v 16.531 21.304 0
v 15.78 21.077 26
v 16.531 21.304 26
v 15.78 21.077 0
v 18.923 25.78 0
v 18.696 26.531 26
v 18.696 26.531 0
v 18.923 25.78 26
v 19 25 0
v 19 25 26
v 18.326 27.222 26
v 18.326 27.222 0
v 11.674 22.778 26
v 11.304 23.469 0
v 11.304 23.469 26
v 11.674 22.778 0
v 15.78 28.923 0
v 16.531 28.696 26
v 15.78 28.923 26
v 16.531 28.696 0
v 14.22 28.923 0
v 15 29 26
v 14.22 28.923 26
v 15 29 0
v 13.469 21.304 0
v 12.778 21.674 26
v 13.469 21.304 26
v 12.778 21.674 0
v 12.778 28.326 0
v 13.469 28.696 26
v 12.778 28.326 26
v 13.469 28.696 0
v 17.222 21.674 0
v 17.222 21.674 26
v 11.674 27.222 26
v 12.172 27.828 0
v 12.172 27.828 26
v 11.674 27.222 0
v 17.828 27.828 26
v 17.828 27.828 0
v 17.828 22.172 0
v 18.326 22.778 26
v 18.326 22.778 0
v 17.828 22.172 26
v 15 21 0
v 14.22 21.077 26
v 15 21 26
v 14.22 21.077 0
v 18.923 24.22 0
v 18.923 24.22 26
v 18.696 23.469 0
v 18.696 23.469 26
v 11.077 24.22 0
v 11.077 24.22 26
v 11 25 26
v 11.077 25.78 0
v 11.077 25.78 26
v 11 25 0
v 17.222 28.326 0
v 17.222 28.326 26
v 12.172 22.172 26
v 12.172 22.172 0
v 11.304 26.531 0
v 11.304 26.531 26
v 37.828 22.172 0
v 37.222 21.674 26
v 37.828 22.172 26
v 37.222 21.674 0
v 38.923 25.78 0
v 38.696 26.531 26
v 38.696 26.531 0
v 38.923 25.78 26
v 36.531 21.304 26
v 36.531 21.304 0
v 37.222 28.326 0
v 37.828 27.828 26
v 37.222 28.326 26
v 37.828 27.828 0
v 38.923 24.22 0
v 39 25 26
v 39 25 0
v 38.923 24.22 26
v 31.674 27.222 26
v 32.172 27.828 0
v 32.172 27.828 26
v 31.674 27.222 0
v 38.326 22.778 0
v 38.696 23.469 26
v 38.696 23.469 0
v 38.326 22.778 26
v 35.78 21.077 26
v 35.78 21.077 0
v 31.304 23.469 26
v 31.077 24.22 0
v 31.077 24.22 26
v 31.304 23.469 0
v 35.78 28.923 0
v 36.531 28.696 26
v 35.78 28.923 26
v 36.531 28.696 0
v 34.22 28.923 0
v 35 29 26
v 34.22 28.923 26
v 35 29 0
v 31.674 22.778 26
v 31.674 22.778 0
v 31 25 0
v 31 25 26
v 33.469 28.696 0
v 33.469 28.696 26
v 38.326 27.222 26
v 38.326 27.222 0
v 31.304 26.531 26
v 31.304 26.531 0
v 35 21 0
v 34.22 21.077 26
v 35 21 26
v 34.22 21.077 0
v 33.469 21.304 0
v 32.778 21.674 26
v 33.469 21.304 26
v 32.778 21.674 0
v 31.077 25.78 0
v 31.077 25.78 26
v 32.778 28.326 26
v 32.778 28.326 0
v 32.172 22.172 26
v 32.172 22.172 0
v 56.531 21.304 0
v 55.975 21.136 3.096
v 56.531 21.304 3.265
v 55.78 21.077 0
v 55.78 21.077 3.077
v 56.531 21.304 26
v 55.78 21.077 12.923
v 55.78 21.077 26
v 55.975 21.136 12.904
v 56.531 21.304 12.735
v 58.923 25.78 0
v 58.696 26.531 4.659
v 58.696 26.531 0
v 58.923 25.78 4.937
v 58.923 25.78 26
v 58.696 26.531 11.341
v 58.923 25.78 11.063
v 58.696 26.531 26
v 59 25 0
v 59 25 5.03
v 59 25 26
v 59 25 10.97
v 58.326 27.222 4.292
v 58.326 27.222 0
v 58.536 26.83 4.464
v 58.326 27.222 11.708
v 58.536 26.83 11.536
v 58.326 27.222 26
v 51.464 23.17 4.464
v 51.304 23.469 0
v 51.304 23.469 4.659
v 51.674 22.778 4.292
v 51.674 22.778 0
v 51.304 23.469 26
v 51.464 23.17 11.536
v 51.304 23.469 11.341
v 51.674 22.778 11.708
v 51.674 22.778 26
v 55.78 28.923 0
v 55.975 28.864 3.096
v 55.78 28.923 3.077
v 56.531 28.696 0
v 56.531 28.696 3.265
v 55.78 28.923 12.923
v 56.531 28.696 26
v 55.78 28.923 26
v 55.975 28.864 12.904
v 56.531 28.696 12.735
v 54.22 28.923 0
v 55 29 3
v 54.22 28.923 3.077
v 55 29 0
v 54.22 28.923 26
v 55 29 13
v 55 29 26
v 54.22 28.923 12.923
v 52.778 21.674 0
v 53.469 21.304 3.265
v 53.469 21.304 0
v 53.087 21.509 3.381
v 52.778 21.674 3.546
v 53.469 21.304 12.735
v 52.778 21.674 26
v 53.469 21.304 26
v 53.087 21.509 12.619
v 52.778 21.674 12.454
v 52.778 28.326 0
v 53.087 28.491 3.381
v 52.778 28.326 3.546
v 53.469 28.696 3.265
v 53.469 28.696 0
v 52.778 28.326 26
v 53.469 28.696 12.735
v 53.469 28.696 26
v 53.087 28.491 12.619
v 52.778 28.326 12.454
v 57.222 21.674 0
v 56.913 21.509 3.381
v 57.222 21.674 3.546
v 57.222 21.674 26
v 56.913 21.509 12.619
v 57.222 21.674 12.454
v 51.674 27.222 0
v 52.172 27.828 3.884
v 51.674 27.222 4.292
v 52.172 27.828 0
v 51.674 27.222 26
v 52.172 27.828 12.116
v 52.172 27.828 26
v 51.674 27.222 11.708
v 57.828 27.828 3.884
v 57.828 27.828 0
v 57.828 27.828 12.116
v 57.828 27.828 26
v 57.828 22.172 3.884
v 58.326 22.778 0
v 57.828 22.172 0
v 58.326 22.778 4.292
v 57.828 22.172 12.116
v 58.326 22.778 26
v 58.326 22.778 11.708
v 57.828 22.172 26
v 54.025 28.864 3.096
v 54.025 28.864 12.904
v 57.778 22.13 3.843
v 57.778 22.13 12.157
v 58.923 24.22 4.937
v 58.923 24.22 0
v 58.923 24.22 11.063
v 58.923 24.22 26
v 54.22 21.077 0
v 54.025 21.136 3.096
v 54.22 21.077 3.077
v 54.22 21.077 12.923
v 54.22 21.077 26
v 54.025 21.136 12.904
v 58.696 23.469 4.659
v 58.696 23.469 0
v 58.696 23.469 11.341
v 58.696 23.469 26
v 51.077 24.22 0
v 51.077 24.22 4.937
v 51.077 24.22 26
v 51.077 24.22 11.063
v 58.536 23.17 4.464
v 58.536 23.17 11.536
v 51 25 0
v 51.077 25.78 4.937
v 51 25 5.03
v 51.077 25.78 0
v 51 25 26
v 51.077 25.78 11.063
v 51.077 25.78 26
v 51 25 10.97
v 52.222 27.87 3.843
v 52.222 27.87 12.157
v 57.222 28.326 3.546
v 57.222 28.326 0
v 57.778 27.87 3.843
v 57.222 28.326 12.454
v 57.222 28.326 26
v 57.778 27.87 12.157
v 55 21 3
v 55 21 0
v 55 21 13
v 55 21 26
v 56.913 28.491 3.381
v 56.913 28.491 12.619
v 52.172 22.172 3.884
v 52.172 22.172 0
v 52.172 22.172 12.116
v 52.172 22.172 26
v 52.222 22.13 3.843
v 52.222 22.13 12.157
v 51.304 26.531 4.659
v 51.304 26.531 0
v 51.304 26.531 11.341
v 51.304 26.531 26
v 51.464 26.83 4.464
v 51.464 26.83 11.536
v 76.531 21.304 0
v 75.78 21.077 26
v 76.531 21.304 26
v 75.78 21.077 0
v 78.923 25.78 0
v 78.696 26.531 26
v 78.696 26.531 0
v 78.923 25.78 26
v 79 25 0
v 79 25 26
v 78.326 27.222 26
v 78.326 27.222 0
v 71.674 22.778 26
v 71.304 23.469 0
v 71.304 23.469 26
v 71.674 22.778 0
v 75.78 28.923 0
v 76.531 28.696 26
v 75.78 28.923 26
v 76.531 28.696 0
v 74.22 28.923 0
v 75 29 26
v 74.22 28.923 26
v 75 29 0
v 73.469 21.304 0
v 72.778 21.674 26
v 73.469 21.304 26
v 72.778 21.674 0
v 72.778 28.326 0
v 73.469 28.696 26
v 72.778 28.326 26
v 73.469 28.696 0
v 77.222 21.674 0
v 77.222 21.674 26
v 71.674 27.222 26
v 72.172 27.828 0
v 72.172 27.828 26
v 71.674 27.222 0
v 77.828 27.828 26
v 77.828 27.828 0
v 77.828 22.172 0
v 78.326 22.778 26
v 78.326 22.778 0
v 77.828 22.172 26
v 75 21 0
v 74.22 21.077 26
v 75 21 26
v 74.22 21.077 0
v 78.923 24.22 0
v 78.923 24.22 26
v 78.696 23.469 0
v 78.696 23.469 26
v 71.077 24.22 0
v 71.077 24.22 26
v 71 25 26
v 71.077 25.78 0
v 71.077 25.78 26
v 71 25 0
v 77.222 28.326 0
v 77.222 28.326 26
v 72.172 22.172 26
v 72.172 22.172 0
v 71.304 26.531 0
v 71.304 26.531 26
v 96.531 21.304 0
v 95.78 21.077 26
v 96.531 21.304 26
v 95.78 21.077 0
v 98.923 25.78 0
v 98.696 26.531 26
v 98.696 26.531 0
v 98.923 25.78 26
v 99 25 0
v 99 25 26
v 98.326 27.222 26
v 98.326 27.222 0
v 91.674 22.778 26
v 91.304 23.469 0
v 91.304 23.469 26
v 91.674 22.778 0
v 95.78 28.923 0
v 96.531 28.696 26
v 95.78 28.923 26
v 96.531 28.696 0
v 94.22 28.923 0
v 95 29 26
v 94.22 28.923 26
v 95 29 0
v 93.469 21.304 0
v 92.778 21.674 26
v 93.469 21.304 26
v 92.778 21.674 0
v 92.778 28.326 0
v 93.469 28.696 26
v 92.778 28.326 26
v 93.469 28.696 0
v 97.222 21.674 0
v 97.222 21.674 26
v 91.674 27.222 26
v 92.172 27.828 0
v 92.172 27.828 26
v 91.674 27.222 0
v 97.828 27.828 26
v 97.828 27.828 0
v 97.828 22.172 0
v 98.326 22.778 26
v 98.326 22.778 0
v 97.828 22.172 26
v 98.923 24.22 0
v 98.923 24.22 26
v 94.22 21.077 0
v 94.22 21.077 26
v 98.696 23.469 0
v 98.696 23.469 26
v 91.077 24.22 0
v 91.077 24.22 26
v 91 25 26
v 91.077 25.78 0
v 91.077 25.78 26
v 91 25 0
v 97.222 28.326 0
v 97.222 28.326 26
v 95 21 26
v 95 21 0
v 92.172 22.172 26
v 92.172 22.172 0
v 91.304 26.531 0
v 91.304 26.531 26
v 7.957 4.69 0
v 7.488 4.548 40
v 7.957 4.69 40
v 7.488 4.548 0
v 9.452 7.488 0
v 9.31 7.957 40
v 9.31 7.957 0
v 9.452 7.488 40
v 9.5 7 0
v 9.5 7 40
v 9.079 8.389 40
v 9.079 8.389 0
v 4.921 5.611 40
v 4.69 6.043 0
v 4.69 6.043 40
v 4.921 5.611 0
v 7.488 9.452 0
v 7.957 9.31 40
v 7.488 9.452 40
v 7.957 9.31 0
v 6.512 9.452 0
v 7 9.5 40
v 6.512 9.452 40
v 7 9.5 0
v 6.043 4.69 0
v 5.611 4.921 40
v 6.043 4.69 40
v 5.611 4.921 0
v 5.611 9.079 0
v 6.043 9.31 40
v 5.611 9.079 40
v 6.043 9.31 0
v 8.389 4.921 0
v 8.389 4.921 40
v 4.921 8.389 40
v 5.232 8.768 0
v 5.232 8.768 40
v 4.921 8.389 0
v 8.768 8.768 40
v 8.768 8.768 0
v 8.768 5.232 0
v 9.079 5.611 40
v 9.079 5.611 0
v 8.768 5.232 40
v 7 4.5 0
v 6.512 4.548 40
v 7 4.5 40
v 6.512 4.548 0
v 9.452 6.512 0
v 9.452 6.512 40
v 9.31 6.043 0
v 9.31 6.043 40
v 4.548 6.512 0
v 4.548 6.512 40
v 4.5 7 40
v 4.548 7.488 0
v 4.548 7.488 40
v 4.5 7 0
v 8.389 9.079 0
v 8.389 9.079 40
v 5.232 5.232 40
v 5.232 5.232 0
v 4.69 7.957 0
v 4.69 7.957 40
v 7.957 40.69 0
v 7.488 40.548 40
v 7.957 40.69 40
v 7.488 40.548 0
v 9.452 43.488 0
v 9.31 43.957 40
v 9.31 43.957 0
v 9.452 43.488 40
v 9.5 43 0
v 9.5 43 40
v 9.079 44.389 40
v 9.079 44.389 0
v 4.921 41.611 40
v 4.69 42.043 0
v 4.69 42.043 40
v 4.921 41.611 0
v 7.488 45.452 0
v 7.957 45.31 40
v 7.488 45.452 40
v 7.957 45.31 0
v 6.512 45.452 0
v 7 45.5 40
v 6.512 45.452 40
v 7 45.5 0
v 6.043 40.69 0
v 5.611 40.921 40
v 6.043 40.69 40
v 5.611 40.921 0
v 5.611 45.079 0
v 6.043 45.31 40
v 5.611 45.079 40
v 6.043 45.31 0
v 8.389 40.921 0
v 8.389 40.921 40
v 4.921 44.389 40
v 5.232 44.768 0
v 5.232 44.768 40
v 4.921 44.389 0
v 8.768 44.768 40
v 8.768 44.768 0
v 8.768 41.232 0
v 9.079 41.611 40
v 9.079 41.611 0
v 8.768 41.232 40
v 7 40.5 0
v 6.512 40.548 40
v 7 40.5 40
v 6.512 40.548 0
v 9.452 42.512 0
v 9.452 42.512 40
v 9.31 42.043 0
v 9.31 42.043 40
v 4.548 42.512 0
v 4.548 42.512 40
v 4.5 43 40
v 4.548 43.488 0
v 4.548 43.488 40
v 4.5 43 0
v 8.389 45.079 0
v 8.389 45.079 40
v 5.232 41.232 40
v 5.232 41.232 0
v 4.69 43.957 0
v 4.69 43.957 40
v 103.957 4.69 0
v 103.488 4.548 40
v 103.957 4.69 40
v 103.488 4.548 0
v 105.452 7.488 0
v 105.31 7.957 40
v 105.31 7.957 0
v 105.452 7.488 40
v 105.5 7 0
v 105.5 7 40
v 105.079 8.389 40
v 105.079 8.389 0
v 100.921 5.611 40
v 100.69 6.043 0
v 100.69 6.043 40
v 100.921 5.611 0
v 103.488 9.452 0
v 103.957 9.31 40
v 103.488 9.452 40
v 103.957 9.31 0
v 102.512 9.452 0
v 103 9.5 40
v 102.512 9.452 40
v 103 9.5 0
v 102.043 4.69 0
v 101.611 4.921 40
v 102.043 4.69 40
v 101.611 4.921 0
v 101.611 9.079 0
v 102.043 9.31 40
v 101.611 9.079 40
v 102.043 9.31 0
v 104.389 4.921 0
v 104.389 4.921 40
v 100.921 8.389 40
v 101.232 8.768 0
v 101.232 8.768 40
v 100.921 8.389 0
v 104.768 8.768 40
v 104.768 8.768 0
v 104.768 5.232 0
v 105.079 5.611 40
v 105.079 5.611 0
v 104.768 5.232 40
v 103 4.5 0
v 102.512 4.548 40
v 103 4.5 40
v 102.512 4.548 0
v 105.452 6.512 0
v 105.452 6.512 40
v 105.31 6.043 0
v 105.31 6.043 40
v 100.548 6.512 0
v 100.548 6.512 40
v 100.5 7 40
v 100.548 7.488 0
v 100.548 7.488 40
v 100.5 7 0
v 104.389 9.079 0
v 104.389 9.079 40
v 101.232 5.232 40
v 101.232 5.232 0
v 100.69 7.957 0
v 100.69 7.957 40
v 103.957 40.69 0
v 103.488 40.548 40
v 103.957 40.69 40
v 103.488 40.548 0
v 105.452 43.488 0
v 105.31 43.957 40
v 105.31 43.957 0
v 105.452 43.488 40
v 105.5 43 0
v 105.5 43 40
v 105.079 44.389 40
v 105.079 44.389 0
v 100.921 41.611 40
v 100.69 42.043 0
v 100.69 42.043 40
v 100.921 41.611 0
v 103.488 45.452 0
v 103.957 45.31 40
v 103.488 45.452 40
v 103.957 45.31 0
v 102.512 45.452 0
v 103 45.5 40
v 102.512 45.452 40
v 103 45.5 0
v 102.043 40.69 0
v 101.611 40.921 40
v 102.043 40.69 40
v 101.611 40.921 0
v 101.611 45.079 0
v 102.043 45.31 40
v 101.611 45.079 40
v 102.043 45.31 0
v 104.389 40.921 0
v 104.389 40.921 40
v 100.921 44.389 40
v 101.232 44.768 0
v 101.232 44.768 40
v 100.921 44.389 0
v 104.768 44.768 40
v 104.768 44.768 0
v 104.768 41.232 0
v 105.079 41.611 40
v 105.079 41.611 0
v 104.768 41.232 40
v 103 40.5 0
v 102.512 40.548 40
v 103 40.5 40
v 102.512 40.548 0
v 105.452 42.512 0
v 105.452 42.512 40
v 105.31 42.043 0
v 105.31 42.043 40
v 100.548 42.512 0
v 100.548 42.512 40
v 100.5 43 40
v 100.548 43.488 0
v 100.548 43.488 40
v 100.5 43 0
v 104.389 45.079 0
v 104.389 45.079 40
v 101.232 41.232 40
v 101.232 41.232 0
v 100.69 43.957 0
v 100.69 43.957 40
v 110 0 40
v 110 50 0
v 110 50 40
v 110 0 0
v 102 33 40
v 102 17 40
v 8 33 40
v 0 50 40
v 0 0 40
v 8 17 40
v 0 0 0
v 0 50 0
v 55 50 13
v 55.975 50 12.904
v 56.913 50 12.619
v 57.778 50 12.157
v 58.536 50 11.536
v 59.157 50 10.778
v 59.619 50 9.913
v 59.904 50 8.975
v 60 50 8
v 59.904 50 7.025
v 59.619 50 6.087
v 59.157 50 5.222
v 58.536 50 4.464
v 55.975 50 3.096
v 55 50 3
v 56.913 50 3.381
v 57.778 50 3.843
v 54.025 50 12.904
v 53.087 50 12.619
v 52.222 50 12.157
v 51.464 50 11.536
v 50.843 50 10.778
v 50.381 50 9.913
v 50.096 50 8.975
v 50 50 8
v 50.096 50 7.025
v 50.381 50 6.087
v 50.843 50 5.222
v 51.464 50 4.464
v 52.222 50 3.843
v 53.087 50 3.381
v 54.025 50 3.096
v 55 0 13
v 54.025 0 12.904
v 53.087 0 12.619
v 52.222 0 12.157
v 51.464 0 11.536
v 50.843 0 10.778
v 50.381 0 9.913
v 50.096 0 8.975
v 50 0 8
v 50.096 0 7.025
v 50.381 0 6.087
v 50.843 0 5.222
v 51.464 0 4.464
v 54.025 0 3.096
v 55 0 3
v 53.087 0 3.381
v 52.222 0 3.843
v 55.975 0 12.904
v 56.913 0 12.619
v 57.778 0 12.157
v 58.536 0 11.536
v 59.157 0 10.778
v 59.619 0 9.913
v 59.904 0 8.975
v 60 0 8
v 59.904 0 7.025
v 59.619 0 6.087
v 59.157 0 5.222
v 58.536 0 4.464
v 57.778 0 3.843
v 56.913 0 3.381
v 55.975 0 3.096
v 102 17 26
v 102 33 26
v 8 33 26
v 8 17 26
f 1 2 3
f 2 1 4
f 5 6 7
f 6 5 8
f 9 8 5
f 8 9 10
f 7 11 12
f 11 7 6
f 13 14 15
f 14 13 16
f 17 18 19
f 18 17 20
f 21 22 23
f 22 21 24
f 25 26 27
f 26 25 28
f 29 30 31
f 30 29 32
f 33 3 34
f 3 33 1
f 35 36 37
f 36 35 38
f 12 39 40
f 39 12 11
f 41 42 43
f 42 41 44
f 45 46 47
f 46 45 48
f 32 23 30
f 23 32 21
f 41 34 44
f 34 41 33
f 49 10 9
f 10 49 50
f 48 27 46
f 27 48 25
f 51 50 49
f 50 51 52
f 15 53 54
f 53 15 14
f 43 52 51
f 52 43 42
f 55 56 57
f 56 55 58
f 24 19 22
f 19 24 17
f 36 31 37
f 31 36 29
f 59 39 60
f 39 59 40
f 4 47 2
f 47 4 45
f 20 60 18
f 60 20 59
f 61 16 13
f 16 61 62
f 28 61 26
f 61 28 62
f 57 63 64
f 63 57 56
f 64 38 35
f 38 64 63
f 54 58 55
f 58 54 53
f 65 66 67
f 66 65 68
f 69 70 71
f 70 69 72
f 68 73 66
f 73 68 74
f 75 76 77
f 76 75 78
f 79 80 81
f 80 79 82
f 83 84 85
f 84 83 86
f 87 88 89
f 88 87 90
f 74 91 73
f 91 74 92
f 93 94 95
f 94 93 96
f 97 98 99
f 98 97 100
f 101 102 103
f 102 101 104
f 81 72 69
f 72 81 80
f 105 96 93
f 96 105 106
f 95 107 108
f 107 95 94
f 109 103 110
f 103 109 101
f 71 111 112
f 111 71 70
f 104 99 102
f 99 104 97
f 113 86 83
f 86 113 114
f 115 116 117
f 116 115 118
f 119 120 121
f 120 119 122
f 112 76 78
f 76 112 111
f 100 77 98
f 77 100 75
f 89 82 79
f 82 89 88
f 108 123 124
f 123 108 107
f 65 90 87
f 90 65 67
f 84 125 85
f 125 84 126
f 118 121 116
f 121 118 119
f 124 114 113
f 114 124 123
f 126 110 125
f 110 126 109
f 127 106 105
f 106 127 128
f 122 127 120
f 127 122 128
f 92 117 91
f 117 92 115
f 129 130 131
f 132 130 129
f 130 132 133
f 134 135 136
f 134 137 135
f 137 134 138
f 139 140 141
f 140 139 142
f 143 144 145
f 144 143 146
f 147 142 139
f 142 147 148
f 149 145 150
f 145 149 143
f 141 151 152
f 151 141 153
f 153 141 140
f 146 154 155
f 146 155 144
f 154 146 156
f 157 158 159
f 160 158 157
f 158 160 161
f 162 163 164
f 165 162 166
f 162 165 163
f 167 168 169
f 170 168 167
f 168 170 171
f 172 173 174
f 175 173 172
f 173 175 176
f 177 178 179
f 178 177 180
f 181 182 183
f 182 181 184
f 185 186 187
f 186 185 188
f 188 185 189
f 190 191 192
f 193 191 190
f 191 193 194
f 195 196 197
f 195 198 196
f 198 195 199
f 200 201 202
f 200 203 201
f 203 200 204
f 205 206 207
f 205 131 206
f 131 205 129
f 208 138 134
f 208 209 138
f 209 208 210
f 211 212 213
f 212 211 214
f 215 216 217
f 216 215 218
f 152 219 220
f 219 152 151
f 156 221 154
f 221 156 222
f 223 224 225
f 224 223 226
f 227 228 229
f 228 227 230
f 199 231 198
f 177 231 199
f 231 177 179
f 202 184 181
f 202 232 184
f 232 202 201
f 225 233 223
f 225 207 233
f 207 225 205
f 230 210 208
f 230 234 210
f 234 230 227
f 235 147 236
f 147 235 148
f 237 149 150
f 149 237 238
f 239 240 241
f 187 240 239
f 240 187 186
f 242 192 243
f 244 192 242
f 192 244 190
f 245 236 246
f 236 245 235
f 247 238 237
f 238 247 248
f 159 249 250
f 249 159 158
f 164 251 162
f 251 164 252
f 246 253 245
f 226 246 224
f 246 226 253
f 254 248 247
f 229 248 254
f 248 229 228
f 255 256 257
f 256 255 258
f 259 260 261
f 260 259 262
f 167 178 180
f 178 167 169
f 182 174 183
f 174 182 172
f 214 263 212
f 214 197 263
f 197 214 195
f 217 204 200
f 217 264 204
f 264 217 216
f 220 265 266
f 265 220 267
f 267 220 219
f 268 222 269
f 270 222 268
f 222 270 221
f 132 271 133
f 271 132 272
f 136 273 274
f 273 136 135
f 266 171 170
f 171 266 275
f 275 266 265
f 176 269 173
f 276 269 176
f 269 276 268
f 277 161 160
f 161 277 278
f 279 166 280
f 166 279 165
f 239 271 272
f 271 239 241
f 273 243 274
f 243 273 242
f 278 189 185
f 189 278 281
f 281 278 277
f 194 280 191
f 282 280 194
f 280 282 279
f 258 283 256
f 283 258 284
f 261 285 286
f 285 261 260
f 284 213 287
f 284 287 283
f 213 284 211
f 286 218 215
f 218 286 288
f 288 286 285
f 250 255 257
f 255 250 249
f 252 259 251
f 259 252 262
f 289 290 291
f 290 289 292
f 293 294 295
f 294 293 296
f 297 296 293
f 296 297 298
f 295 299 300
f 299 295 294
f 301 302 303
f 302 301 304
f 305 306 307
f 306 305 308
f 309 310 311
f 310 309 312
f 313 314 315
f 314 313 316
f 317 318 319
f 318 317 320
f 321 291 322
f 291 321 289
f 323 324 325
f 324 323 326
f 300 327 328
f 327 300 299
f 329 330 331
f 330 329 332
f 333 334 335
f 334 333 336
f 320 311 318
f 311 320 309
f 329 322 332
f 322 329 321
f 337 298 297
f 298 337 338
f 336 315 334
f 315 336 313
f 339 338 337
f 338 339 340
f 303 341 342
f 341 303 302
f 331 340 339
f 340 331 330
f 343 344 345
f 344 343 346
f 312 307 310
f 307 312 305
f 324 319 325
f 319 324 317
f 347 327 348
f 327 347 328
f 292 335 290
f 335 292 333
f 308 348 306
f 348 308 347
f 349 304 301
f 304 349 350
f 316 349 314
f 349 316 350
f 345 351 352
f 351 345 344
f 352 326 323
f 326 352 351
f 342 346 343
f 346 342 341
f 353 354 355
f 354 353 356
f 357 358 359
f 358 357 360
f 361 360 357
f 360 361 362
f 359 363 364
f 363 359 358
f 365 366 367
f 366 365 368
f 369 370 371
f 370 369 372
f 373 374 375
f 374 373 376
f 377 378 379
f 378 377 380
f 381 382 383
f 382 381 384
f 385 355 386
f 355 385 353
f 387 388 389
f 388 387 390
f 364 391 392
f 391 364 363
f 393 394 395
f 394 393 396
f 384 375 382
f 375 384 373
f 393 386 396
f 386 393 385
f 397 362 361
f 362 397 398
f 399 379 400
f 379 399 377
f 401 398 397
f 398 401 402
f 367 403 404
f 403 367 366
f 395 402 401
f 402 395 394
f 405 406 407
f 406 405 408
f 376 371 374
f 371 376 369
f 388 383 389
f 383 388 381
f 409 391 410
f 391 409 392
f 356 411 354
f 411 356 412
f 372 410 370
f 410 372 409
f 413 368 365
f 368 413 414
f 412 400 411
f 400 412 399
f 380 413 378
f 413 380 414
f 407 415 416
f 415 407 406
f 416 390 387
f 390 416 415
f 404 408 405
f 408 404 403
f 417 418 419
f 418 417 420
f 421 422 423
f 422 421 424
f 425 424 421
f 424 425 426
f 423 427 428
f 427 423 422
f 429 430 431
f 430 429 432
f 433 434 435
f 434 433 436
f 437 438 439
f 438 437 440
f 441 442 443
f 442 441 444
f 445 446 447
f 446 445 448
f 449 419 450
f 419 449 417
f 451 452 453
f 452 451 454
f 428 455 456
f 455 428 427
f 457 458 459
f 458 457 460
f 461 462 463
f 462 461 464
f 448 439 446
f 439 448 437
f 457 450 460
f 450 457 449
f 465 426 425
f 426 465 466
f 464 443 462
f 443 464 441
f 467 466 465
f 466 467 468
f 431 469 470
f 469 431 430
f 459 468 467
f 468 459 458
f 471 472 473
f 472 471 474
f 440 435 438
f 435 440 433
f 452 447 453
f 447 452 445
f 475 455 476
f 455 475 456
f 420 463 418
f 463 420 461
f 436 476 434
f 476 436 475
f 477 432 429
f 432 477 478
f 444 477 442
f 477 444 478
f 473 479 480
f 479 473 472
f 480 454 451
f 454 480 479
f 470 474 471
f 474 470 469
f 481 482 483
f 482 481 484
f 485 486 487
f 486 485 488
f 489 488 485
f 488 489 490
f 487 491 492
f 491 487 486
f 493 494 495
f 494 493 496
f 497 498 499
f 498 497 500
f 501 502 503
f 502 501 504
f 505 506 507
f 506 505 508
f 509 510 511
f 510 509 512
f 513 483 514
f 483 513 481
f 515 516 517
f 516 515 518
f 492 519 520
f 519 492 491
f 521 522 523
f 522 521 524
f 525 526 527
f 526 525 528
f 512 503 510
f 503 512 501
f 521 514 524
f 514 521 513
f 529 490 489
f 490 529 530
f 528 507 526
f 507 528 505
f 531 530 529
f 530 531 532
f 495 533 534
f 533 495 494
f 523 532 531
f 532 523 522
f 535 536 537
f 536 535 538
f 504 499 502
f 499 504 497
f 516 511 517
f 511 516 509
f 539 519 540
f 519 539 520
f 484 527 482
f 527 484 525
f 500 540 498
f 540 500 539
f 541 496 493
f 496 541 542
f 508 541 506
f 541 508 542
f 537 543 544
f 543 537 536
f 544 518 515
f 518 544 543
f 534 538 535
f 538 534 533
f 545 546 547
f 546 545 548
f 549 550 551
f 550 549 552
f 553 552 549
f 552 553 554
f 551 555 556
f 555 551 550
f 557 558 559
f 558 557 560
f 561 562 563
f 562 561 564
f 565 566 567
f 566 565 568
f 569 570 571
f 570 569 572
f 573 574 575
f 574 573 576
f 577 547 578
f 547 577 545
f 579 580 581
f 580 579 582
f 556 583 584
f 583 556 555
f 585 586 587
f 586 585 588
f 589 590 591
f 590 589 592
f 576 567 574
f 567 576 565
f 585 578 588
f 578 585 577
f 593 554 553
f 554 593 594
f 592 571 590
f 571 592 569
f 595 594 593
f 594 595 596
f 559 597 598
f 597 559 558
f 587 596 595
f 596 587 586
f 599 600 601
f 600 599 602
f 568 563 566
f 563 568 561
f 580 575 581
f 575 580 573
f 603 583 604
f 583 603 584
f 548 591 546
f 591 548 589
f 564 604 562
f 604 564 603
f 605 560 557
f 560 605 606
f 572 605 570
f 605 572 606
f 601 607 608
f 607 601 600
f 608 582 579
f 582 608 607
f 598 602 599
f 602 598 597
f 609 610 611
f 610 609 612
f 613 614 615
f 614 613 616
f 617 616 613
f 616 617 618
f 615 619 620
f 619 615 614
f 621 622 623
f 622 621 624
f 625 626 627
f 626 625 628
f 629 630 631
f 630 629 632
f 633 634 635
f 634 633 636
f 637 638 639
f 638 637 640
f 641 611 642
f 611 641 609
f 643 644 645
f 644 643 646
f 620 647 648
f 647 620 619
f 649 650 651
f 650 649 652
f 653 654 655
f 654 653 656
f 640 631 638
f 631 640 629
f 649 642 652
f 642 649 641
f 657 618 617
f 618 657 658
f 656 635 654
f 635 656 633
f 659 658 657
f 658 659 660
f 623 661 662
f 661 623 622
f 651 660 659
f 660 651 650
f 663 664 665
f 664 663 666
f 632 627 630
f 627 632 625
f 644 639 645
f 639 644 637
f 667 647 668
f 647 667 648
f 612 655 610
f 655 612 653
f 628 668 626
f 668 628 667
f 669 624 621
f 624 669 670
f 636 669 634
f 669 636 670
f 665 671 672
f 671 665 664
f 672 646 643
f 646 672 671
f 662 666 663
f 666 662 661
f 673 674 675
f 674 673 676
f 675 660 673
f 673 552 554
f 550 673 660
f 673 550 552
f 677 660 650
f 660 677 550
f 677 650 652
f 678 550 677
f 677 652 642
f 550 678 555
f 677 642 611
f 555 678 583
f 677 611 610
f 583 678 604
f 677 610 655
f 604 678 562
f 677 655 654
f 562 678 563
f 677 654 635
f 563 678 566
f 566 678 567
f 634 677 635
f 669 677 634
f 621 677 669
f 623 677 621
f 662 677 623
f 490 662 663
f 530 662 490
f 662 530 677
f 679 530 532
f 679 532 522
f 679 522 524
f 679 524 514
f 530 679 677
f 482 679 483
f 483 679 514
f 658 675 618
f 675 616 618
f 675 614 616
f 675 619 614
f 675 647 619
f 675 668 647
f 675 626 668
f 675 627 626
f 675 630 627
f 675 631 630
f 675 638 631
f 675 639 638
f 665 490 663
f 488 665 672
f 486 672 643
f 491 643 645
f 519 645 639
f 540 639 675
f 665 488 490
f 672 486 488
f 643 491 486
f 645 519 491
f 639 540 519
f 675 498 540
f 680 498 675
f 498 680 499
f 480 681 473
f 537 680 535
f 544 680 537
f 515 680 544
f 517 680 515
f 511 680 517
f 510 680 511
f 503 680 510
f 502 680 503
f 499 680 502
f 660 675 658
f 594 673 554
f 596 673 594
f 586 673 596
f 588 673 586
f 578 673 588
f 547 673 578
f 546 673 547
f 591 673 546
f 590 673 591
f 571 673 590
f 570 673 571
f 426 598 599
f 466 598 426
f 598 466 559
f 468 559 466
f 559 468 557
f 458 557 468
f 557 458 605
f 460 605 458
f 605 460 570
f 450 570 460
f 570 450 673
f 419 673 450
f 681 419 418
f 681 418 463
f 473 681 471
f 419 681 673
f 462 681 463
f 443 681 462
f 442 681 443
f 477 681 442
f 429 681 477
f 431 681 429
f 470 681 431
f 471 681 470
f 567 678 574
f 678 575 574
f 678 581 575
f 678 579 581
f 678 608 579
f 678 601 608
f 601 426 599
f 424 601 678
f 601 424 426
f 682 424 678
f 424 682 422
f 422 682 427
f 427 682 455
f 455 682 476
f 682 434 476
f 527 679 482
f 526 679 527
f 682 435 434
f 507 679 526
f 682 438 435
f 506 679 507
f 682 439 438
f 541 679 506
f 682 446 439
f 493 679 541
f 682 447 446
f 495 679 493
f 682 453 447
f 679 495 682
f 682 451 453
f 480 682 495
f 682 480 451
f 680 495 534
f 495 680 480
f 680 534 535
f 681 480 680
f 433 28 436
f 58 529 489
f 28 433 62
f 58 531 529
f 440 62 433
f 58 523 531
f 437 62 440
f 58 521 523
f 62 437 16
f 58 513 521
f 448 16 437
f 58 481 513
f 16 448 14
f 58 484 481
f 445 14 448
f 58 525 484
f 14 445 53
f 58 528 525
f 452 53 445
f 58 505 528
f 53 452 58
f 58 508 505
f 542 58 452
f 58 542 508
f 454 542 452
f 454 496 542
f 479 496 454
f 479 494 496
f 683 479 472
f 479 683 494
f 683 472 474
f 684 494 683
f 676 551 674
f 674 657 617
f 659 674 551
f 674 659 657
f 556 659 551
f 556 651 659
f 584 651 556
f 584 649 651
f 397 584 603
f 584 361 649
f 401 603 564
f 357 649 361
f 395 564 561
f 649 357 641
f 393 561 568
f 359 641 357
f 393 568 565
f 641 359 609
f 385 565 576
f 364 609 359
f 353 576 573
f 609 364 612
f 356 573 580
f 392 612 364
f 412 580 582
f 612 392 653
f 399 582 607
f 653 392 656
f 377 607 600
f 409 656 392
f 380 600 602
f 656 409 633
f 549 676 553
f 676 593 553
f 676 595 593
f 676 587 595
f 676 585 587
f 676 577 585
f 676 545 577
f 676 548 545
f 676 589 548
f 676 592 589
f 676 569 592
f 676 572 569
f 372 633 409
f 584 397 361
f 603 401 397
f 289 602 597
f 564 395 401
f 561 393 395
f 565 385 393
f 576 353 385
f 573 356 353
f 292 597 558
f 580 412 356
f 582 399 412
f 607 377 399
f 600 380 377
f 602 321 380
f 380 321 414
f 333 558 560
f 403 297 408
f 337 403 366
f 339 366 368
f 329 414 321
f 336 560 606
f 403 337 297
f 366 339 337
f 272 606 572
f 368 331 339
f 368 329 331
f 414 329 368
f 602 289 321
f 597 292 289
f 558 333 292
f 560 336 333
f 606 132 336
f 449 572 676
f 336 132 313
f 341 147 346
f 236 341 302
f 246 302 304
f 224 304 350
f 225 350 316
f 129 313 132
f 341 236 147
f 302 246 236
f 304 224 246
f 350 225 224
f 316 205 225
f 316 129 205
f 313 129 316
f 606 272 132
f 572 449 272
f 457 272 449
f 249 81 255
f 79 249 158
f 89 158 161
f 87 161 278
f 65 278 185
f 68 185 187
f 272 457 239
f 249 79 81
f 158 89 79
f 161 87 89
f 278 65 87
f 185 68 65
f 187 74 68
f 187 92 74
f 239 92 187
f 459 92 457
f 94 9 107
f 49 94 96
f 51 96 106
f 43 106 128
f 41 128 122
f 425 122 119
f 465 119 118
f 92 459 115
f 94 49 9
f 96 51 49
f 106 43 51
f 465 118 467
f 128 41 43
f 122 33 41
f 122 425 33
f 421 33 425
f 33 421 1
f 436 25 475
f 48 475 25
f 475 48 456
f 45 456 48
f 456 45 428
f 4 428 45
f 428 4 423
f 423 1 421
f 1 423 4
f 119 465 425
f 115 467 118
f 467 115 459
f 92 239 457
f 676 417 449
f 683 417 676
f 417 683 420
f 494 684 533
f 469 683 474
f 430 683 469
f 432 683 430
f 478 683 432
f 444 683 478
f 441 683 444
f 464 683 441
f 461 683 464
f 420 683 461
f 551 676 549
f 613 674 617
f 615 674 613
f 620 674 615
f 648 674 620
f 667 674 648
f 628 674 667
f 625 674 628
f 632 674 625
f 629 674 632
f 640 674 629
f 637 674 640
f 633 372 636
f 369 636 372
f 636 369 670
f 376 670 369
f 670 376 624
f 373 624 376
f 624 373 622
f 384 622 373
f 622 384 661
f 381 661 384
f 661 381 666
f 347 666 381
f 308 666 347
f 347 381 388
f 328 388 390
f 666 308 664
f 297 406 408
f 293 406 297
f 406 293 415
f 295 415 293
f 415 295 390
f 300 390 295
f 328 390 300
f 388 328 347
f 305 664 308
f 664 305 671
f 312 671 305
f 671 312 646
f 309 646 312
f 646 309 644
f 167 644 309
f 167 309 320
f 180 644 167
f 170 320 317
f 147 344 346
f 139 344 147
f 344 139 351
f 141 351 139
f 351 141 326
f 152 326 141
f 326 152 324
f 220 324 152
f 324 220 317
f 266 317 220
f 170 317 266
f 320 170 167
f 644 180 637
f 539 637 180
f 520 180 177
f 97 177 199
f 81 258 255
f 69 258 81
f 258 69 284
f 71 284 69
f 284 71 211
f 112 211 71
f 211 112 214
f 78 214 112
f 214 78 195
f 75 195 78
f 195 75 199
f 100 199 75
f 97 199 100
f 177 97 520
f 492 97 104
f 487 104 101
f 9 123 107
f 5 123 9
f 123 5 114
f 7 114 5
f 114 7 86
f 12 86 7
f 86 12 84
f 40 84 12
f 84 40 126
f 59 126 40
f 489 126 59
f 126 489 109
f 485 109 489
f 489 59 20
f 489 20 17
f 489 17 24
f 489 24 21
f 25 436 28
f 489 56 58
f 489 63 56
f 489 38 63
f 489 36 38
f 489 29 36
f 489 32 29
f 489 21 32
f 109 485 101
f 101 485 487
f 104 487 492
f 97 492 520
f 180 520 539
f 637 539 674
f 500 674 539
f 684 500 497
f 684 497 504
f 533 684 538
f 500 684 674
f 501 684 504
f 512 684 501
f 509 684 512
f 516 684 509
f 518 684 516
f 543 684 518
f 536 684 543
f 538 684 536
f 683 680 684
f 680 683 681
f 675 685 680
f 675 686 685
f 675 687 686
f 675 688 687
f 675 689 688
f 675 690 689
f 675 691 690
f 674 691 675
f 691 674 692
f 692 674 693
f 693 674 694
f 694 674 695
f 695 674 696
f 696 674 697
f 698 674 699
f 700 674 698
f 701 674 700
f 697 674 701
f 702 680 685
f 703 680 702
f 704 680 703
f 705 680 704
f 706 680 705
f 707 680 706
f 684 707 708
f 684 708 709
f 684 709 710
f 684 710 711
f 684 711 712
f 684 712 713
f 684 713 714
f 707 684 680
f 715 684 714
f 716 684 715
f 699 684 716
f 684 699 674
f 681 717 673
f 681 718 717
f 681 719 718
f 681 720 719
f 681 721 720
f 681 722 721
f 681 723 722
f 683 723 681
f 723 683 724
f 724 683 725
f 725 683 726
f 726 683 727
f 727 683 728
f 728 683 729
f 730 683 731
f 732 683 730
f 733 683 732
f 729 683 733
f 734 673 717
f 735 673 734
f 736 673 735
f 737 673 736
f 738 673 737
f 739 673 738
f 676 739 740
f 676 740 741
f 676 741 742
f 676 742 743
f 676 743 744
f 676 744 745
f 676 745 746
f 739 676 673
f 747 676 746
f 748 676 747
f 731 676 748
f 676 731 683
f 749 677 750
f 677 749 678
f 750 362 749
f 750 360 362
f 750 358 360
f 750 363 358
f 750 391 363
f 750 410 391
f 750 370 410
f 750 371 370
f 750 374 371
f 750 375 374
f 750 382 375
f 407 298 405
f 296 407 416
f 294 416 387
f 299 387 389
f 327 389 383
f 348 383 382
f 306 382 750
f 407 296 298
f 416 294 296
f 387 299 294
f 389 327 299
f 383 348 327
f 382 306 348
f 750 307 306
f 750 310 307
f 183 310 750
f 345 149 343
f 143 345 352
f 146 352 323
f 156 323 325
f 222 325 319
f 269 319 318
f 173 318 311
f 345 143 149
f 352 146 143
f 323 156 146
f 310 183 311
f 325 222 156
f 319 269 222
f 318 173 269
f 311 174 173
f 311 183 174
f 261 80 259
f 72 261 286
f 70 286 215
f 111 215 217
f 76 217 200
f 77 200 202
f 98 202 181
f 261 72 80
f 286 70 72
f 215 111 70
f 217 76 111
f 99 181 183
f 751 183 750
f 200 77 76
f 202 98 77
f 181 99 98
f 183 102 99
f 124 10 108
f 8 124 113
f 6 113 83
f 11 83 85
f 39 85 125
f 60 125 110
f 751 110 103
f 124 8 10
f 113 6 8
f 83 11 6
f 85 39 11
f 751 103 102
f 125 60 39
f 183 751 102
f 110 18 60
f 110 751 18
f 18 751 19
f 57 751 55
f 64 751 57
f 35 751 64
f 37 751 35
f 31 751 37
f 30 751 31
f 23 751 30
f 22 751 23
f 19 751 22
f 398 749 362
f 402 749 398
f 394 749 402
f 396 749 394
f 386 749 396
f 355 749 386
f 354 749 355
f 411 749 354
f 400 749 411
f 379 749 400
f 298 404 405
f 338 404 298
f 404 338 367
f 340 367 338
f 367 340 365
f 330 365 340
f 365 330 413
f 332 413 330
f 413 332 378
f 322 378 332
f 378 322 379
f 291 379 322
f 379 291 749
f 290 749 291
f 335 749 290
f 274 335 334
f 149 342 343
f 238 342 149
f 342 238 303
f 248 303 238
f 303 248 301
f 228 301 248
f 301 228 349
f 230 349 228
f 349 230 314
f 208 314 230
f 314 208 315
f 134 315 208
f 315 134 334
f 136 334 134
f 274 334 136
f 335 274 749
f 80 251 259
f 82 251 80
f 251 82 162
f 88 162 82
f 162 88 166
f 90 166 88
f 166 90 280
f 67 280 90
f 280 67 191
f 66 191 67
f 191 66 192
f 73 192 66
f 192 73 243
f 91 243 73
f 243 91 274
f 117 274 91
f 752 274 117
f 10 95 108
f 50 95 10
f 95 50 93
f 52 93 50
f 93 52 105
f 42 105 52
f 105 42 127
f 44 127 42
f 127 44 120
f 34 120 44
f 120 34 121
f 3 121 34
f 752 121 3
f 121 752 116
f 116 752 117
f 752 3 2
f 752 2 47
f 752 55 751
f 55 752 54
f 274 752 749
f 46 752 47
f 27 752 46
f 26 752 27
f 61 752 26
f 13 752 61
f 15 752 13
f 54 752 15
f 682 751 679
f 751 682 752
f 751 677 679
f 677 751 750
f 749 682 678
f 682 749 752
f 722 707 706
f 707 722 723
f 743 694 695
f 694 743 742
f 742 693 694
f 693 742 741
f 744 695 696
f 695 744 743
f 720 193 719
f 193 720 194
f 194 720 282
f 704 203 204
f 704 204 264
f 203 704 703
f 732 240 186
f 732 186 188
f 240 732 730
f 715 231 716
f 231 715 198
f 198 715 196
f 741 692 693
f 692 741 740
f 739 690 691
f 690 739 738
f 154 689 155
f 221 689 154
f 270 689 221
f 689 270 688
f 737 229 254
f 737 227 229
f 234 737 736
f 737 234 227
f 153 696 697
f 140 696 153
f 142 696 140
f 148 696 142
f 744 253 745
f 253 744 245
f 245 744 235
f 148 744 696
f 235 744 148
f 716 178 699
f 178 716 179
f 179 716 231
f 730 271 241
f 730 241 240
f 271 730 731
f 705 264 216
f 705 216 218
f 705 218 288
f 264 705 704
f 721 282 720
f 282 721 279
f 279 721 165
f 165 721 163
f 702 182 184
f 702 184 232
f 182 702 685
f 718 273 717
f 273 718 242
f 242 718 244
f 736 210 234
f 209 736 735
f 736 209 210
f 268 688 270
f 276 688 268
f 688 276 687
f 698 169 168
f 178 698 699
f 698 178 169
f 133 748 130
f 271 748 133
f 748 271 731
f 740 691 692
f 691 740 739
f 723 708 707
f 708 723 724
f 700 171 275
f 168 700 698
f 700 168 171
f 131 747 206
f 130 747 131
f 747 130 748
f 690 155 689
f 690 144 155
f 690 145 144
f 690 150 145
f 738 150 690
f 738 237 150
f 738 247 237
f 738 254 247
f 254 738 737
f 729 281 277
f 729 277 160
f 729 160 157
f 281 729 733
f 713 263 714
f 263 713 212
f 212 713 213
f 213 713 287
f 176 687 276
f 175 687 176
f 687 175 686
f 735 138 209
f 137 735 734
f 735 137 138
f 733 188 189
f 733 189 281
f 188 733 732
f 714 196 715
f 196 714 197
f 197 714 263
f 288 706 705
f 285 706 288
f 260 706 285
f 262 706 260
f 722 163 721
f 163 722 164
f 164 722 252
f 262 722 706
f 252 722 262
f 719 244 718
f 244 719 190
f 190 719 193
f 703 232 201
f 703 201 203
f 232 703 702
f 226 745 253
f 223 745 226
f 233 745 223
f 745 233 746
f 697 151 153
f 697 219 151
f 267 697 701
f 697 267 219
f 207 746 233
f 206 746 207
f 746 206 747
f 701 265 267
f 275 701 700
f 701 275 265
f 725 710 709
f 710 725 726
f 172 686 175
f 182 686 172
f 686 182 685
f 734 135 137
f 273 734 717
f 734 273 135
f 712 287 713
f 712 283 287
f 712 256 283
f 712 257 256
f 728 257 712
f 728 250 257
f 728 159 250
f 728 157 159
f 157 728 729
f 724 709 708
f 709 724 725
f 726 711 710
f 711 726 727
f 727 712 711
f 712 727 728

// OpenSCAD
$fn = 32;

// ----------------------------------------------------------------------
// Manifold block: side_outlet manifold
// ----------------------------------------------------------------------

// --- parameters (mm) ---
block_l = 110;            // block length, X
block_w = 50;             // block width, Y
block_h = 40;             // block height, Z
port_d = 8;               // port bore diameter
port_pitch = 20;          // port pitch along X
gallery_d = 16;           // top gallery width, Y
gallery_depth = 14;       // gallery pocket depth
wall_p = 8;               // gallery end wall thickness, X
mnt_d = 5;                // mounting hole diameter
mnt_in = 7;               // mounting hole inset from the edges
out_d = 10;               // outlet bore diameter
out_z = 8;                // outlet axis height

n_ports = 5;  // ports in the row
port_x0 = (block_l - (n_ports - 1) * port_pitch) / 2;  // first port X

difference() {
  cube([block_l, block_w, block_h]);
  for (i = [0 : n_ports - 1])
    translate([port_x0 + i * port_pitch, block_w / 2, -1])
      cylinder(h = block_h + 2, d = port_d);
  translate([wall_p, block_w / 2 - gallery_d / 2, block_h - gallery_depth])
    cube([block_l - 2 * wall_p, gallery_d, gallery_depth + 1]);
  for (cx = [mnt_in, block_l - mnt_in])
    for (cy = [mnt_in, block_w - mnt_in])
      translate([cx, cy, -1]) cylinder(h = block_h + 2, d = mnt_d);
  translate([block_l / 2, -1, out_z]) rotate([-90, 0, 0])
    cylinder(h = block_w + 2, d = out_d);
}
